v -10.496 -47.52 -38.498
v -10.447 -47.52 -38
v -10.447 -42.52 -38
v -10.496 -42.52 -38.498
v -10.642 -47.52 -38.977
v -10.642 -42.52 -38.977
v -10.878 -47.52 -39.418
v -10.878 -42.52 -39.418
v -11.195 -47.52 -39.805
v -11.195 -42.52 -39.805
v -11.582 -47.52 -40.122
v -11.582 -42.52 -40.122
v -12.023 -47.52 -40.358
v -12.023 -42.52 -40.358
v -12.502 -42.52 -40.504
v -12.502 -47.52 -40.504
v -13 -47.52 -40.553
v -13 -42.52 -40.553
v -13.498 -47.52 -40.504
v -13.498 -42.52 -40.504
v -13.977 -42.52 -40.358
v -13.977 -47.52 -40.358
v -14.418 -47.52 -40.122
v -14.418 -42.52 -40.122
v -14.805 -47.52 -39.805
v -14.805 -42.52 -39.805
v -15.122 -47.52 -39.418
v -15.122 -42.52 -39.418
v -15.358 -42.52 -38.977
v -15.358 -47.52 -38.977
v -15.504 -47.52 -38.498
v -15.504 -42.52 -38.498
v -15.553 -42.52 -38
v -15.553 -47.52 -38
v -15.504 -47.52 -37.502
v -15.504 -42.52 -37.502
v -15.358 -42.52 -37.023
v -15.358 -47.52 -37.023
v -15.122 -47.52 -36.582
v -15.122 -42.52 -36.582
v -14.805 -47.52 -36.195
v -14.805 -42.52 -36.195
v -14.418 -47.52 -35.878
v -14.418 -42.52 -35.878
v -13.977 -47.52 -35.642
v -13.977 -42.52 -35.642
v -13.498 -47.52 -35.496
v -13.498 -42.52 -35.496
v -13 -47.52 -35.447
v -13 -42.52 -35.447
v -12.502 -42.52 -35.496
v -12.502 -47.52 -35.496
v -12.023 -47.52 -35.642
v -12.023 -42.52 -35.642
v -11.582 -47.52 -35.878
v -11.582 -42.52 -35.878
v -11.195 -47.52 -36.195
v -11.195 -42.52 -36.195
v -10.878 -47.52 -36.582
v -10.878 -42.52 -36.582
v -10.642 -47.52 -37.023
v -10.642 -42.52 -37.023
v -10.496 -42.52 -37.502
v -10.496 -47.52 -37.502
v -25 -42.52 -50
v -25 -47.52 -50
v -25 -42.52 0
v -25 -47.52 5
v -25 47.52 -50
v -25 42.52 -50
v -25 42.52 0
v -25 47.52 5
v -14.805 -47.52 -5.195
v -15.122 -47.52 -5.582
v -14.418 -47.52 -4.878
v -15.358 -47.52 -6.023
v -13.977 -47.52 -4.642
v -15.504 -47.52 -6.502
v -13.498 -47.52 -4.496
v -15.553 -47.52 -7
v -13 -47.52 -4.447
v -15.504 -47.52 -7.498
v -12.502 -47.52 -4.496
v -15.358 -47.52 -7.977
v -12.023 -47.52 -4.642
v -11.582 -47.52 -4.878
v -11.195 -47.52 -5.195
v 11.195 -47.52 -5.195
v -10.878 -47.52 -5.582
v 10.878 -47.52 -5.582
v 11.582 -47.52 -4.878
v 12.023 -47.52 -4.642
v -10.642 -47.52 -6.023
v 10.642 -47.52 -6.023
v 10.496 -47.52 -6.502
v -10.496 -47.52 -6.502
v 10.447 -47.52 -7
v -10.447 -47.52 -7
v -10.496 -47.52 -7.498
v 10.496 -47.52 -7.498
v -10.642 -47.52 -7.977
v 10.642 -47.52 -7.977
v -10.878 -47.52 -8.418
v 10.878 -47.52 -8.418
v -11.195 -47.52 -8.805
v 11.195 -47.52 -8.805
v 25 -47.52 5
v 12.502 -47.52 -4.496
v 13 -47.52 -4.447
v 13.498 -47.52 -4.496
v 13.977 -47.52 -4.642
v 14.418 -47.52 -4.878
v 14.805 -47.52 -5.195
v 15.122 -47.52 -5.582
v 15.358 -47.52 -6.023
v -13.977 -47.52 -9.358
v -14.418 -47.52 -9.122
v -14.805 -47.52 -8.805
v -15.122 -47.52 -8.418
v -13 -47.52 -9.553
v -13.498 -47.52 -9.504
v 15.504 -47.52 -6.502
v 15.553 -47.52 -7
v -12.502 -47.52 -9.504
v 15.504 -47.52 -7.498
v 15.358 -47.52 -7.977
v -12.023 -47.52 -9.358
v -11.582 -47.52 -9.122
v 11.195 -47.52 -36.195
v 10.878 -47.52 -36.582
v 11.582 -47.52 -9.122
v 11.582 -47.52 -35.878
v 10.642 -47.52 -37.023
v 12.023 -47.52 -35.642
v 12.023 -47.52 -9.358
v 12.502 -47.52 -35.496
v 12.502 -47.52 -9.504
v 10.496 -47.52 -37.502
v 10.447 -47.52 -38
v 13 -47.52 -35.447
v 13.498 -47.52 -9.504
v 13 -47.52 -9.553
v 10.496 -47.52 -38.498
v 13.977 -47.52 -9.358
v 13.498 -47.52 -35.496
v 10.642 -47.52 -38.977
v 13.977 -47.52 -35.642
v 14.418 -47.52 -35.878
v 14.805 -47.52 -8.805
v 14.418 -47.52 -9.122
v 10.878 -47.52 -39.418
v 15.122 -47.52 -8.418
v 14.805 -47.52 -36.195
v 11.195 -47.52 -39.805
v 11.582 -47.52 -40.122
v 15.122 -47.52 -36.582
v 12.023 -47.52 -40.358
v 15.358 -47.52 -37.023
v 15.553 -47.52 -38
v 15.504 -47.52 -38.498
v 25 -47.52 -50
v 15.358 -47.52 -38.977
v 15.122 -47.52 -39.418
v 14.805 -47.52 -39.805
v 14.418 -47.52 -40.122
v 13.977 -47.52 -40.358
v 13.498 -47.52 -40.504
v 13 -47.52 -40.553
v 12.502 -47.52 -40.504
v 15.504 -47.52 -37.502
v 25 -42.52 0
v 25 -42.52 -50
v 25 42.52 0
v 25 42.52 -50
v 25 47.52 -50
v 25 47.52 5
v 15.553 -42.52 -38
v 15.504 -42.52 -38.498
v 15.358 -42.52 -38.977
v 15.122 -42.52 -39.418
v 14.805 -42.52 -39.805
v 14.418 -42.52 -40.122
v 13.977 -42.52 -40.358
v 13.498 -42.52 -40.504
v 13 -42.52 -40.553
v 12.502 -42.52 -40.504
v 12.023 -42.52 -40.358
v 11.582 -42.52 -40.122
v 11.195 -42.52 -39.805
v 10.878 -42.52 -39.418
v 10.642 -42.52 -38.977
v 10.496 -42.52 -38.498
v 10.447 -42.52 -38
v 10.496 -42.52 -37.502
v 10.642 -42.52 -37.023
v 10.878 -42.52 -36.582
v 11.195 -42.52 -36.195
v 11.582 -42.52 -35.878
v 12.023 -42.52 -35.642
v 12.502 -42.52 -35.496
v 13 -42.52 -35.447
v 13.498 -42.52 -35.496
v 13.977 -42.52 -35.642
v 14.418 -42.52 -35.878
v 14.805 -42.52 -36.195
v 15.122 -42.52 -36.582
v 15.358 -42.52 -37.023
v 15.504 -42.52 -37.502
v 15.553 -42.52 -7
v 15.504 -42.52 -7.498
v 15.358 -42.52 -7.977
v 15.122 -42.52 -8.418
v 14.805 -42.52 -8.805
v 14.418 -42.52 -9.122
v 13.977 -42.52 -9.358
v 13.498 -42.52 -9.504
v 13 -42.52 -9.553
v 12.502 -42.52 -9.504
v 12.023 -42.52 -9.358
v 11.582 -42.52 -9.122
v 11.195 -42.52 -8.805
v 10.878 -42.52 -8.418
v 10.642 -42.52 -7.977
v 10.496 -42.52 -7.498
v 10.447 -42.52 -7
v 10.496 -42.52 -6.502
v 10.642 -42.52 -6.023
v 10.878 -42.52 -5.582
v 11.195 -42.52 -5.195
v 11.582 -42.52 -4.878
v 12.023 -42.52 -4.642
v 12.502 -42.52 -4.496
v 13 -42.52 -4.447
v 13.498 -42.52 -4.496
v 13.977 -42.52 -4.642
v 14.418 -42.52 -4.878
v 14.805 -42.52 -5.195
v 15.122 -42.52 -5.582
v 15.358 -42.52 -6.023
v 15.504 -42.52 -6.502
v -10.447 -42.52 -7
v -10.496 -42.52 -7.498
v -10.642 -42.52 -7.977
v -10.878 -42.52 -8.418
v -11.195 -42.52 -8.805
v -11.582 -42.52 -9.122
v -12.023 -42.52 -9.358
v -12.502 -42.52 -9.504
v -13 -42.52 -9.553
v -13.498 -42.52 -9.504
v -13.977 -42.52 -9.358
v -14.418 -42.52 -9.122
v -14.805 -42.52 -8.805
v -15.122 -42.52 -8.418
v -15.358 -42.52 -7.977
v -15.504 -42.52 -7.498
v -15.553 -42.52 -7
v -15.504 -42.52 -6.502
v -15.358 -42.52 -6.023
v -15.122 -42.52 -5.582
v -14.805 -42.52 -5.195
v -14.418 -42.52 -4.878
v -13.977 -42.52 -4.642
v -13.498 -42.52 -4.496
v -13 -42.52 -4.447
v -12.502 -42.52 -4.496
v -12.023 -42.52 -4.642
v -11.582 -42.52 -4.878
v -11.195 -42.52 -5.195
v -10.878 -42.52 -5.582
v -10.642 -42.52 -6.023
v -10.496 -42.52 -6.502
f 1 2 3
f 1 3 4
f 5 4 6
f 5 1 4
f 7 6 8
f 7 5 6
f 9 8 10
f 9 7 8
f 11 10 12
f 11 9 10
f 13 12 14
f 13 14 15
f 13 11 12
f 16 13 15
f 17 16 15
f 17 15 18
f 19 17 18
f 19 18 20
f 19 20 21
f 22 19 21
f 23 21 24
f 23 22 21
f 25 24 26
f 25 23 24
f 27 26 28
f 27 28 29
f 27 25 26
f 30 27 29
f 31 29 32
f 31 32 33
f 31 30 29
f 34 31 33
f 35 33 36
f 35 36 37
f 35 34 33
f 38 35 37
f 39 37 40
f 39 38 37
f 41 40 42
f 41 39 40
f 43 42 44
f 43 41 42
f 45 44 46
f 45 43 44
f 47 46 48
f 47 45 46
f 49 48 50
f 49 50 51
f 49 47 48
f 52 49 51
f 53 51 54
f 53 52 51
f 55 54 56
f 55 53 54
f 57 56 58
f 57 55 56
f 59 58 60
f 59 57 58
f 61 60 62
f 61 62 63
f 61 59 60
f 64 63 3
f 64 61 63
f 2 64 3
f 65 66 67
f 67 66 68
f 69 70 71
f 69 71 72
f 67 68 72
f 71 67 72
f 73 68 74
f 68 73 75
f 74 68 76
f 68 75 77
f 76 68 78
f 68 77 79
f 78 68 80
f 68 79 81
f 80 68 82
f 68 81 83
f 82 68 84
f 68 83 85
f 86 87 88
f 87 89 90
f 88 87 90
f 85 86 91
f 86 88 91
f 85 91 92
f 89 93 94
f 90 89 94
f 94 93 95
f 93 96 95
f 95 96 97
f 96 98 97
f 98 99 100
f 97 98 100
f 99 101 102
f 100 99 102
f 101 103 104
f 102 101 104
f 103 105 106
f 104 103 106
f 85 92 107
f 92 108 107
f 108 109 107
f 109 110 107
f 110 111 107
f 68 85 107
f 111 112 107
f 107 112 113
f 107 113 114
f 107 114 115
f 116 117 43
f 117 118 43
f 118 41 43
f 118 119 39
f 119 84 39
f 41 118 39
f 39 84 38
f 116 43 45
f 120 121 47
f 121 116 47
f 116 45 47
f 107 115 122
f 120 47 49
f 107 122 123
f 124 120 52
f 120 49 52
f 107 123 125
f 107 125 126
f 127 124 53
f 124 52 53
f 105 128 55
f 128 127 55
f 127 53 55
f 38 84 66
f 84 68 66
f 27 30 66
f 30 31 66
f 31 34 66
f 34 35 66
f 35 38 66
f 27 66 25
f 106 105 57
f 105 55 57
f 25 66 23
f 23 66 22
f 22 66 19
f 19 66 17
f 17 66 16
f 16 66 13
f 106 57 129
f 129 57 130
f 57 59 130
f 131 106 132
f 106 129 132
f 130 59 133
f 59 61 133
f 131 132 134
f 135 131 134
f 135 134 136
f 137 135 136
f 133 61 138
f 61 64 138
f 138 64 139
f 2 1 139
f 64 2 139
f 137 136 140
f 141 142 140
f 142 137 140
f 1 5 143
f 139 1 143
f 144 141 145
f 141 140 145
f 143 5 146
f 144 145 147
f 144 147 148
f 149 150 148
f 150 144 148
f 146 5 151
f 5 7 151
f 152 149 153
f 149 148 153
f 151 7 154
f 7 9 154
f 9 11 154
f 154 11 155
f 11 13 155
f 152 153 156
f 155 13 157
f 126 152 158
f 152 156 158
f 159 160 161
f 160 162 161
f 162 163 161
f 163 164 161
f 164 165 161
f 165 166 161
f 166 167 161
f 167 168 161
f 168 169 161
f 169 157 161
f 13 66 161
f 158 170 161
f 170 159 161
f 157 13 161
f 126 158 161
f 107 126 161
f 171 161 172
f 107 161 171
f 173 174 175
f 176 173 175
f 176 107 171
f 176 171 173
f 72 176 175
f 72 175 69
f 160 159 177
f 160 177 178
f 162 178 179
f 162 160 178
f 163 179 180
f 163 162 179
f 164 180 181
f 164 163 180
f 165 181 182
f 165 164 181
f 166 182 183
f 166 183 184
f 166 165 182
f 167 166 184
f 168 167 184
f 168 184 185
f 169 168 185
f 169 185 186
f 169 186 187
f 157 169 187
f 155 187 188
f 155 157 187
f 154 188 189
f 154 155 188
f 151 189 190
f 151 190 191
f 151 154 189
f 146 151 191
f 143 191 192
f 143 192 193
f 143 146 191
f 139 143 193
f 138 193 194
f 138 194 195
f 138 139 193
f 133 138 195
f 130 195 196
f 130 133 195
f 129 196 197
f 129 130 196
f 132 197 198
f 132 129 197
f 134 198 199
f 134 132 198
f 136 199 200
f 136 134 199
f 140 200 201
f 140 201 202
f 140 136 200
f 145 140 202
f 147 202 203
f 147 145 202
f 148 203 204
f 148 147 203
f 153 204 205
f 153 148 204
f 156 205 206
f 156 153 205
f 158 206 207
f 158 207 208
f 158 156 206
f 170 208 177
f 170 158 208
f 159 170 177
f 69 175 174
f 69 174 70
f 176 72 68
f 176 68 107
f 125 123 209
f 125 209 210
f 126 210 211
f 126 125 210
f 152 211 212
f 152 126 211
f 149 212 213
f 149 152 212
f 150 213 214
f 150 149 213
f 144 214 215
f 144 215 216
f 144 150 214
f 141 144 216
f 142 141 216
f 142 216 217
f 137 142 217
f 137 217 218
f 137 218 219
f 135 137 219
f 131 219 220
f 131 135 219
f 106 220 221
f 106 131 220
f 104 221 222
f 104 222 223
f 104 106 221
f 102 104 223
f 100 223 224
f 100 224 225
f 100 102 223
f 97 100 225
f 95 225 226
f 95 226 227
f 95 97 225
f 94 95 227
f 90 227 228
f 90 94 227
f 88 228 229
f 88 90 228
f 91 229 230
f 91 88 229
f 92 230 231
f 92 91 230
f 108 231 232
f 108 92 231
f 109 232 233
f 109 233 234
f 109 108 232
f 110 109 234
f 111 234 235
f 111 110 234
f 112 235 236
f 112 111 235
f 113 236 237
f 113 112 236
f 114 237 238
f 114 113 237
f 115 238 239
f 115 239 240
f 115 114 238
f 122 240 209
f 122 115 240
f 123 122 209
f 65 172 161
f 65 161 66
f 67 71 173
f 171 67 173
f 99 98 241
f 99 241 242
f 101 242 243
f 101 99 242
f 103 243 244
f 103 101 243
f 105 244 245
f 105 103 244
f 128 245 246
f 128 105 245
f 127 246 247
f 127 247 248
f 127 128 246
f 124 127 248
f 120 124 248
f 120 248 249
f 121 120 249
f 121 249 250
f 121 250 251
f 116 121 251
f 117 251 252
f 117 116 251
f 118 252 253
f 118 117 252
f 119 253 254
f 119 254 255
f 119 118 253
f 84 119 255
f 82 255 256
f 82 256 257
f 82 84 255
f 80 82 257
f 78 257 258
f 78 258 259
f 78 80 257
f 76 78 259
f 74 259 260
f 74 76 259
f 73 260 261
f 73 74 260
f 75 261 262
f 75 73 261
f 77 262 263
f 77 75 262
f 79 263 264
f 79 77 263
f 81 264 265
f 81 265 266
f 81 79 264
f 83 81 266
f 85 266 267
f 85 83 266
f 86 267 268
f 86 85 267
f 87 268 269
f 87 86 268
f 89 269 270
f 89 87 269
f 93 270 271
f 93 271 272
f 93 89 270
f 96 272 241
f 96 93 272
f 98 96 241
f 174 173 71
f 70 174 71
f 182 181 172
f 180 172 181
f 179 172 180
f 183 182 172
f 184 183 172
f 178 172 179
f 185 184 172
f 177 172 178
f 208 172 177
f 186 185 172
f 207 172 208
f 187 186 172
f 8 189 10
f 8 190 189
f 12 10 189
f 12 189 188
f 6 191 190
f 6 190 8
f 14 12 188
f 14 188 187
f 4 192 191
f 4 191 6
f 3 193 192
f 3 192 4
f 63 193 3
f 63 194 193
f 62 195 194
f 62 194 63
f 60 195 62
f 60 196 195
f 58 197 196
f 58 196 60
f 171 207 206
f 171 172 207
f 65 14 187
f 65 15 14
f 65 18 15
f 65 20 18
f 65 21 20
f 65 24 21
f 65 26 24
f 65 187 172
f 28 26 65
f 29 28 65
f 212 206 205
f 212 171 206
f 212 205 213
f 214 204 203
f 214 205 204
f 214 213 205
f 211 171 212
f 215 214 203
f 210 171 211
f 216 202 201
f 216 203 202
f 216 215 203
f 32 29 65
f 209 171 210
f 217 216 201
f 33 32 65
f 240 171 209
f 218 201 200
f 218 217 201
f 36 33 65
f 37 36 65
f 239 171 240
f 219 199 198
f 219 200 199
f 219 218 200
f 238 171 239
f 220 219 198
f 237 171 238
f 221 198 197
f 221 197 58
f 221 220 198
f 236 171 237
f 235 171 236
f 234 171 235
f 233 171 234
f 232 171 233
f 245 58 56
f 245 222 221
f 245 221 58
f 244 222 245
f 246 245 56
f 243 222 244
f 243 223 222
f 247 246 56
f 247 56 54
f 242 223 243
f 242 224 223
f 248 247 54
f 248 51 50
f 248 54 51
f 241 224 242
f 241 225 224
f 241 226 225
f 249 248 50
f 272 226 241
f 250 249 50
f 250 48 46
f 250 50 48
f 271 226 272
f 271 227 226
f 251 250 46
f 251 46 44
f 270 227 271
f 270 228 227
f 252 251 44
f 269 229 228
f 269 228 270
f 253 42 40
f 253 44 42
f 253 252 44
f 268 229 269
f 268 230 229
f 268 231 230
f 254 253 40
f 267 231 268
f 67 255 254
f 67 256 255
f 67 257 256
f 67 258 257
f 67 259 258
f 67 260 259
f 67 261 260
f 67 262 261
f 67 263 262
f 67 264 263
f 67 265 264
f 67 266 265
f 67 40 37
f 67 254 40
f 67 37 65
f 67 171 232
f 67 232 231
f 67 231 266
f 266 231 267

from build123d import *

# Parameters (mm, degrees)
SKETCH_1_W                     = 50
SKETCH_1_H                     = 95.04
EXTRUDE_1_DEPTH                = 5
SKETCH_2_W                     = 50
SKETCH_2_H                     = 5
EXTRUDE_2_DEPTH                = 50
HOLE_START                     = -47.52
HOLE_WIZARD_1_4_20_3_OUTLINE_R = 2.5527
HOLE_WIZARD_1_4_20_3_DEPTH     = 5


# Read off the part's stored shape, not the designer's step: 1/4-20 螺纹孔3
with BuildPart() as part:
    # 草图1 → 凸台-拉伸1 (new body)
    with BuildSketch(Plane.XY):
        Rectangle(SKETCH_1_W, SKETCH_1_H)
    extrude(amount=EXTRUDE_1_DEPTH)

    # 草图2 → 凸台-拉伸2 (add)
    with BuildSketch(Plane(origin=(0, 0, 0), x_dir=(-1, 0, 0), z_dir=(0, 0, -1))):
        with Locations((0, 45.02)):
            Rectangle(SKETCH_2_W, SKETCH_2_H)
        with Locations((0, -45.02)):
            Rectangle(SKETCH_2_W, SKETCH_2_H)
    extrude(amount=EXTRUDE_2_DEPTH)

    # 1/4-20 螺纹孔3 outline → 1/4-20 螺纹孔3 (cut)
    with BuildSketch(Plane(origin=(0, 0, 0), x_dir=(1, 0, 0), z_dir=(0, 1, 0)).offset(HOLE_START)):
        with Locations((13, 7)):
            Circle(HOLE_WIZARD_1_4_20_3_OUTLINE_R)
        with Locations((13, 38)):
            Circle(HOLE_WIZARD_1_4_20_3_OUTLINE_R)
        with Locations((-13, 38)):
            Circle(HOLE_WIZARD_1_4_20_3_OUTLINE_R)
        with Locations((-13, 7)):
            Circle(HOLE_WIZARD_1_4_20_3_OUTLINE_R)
    extrude(amount=HOLE_WIZARD_1_4_20_3_DEPTH, mode=Mode.SUBTRACT)


solid = part.part
